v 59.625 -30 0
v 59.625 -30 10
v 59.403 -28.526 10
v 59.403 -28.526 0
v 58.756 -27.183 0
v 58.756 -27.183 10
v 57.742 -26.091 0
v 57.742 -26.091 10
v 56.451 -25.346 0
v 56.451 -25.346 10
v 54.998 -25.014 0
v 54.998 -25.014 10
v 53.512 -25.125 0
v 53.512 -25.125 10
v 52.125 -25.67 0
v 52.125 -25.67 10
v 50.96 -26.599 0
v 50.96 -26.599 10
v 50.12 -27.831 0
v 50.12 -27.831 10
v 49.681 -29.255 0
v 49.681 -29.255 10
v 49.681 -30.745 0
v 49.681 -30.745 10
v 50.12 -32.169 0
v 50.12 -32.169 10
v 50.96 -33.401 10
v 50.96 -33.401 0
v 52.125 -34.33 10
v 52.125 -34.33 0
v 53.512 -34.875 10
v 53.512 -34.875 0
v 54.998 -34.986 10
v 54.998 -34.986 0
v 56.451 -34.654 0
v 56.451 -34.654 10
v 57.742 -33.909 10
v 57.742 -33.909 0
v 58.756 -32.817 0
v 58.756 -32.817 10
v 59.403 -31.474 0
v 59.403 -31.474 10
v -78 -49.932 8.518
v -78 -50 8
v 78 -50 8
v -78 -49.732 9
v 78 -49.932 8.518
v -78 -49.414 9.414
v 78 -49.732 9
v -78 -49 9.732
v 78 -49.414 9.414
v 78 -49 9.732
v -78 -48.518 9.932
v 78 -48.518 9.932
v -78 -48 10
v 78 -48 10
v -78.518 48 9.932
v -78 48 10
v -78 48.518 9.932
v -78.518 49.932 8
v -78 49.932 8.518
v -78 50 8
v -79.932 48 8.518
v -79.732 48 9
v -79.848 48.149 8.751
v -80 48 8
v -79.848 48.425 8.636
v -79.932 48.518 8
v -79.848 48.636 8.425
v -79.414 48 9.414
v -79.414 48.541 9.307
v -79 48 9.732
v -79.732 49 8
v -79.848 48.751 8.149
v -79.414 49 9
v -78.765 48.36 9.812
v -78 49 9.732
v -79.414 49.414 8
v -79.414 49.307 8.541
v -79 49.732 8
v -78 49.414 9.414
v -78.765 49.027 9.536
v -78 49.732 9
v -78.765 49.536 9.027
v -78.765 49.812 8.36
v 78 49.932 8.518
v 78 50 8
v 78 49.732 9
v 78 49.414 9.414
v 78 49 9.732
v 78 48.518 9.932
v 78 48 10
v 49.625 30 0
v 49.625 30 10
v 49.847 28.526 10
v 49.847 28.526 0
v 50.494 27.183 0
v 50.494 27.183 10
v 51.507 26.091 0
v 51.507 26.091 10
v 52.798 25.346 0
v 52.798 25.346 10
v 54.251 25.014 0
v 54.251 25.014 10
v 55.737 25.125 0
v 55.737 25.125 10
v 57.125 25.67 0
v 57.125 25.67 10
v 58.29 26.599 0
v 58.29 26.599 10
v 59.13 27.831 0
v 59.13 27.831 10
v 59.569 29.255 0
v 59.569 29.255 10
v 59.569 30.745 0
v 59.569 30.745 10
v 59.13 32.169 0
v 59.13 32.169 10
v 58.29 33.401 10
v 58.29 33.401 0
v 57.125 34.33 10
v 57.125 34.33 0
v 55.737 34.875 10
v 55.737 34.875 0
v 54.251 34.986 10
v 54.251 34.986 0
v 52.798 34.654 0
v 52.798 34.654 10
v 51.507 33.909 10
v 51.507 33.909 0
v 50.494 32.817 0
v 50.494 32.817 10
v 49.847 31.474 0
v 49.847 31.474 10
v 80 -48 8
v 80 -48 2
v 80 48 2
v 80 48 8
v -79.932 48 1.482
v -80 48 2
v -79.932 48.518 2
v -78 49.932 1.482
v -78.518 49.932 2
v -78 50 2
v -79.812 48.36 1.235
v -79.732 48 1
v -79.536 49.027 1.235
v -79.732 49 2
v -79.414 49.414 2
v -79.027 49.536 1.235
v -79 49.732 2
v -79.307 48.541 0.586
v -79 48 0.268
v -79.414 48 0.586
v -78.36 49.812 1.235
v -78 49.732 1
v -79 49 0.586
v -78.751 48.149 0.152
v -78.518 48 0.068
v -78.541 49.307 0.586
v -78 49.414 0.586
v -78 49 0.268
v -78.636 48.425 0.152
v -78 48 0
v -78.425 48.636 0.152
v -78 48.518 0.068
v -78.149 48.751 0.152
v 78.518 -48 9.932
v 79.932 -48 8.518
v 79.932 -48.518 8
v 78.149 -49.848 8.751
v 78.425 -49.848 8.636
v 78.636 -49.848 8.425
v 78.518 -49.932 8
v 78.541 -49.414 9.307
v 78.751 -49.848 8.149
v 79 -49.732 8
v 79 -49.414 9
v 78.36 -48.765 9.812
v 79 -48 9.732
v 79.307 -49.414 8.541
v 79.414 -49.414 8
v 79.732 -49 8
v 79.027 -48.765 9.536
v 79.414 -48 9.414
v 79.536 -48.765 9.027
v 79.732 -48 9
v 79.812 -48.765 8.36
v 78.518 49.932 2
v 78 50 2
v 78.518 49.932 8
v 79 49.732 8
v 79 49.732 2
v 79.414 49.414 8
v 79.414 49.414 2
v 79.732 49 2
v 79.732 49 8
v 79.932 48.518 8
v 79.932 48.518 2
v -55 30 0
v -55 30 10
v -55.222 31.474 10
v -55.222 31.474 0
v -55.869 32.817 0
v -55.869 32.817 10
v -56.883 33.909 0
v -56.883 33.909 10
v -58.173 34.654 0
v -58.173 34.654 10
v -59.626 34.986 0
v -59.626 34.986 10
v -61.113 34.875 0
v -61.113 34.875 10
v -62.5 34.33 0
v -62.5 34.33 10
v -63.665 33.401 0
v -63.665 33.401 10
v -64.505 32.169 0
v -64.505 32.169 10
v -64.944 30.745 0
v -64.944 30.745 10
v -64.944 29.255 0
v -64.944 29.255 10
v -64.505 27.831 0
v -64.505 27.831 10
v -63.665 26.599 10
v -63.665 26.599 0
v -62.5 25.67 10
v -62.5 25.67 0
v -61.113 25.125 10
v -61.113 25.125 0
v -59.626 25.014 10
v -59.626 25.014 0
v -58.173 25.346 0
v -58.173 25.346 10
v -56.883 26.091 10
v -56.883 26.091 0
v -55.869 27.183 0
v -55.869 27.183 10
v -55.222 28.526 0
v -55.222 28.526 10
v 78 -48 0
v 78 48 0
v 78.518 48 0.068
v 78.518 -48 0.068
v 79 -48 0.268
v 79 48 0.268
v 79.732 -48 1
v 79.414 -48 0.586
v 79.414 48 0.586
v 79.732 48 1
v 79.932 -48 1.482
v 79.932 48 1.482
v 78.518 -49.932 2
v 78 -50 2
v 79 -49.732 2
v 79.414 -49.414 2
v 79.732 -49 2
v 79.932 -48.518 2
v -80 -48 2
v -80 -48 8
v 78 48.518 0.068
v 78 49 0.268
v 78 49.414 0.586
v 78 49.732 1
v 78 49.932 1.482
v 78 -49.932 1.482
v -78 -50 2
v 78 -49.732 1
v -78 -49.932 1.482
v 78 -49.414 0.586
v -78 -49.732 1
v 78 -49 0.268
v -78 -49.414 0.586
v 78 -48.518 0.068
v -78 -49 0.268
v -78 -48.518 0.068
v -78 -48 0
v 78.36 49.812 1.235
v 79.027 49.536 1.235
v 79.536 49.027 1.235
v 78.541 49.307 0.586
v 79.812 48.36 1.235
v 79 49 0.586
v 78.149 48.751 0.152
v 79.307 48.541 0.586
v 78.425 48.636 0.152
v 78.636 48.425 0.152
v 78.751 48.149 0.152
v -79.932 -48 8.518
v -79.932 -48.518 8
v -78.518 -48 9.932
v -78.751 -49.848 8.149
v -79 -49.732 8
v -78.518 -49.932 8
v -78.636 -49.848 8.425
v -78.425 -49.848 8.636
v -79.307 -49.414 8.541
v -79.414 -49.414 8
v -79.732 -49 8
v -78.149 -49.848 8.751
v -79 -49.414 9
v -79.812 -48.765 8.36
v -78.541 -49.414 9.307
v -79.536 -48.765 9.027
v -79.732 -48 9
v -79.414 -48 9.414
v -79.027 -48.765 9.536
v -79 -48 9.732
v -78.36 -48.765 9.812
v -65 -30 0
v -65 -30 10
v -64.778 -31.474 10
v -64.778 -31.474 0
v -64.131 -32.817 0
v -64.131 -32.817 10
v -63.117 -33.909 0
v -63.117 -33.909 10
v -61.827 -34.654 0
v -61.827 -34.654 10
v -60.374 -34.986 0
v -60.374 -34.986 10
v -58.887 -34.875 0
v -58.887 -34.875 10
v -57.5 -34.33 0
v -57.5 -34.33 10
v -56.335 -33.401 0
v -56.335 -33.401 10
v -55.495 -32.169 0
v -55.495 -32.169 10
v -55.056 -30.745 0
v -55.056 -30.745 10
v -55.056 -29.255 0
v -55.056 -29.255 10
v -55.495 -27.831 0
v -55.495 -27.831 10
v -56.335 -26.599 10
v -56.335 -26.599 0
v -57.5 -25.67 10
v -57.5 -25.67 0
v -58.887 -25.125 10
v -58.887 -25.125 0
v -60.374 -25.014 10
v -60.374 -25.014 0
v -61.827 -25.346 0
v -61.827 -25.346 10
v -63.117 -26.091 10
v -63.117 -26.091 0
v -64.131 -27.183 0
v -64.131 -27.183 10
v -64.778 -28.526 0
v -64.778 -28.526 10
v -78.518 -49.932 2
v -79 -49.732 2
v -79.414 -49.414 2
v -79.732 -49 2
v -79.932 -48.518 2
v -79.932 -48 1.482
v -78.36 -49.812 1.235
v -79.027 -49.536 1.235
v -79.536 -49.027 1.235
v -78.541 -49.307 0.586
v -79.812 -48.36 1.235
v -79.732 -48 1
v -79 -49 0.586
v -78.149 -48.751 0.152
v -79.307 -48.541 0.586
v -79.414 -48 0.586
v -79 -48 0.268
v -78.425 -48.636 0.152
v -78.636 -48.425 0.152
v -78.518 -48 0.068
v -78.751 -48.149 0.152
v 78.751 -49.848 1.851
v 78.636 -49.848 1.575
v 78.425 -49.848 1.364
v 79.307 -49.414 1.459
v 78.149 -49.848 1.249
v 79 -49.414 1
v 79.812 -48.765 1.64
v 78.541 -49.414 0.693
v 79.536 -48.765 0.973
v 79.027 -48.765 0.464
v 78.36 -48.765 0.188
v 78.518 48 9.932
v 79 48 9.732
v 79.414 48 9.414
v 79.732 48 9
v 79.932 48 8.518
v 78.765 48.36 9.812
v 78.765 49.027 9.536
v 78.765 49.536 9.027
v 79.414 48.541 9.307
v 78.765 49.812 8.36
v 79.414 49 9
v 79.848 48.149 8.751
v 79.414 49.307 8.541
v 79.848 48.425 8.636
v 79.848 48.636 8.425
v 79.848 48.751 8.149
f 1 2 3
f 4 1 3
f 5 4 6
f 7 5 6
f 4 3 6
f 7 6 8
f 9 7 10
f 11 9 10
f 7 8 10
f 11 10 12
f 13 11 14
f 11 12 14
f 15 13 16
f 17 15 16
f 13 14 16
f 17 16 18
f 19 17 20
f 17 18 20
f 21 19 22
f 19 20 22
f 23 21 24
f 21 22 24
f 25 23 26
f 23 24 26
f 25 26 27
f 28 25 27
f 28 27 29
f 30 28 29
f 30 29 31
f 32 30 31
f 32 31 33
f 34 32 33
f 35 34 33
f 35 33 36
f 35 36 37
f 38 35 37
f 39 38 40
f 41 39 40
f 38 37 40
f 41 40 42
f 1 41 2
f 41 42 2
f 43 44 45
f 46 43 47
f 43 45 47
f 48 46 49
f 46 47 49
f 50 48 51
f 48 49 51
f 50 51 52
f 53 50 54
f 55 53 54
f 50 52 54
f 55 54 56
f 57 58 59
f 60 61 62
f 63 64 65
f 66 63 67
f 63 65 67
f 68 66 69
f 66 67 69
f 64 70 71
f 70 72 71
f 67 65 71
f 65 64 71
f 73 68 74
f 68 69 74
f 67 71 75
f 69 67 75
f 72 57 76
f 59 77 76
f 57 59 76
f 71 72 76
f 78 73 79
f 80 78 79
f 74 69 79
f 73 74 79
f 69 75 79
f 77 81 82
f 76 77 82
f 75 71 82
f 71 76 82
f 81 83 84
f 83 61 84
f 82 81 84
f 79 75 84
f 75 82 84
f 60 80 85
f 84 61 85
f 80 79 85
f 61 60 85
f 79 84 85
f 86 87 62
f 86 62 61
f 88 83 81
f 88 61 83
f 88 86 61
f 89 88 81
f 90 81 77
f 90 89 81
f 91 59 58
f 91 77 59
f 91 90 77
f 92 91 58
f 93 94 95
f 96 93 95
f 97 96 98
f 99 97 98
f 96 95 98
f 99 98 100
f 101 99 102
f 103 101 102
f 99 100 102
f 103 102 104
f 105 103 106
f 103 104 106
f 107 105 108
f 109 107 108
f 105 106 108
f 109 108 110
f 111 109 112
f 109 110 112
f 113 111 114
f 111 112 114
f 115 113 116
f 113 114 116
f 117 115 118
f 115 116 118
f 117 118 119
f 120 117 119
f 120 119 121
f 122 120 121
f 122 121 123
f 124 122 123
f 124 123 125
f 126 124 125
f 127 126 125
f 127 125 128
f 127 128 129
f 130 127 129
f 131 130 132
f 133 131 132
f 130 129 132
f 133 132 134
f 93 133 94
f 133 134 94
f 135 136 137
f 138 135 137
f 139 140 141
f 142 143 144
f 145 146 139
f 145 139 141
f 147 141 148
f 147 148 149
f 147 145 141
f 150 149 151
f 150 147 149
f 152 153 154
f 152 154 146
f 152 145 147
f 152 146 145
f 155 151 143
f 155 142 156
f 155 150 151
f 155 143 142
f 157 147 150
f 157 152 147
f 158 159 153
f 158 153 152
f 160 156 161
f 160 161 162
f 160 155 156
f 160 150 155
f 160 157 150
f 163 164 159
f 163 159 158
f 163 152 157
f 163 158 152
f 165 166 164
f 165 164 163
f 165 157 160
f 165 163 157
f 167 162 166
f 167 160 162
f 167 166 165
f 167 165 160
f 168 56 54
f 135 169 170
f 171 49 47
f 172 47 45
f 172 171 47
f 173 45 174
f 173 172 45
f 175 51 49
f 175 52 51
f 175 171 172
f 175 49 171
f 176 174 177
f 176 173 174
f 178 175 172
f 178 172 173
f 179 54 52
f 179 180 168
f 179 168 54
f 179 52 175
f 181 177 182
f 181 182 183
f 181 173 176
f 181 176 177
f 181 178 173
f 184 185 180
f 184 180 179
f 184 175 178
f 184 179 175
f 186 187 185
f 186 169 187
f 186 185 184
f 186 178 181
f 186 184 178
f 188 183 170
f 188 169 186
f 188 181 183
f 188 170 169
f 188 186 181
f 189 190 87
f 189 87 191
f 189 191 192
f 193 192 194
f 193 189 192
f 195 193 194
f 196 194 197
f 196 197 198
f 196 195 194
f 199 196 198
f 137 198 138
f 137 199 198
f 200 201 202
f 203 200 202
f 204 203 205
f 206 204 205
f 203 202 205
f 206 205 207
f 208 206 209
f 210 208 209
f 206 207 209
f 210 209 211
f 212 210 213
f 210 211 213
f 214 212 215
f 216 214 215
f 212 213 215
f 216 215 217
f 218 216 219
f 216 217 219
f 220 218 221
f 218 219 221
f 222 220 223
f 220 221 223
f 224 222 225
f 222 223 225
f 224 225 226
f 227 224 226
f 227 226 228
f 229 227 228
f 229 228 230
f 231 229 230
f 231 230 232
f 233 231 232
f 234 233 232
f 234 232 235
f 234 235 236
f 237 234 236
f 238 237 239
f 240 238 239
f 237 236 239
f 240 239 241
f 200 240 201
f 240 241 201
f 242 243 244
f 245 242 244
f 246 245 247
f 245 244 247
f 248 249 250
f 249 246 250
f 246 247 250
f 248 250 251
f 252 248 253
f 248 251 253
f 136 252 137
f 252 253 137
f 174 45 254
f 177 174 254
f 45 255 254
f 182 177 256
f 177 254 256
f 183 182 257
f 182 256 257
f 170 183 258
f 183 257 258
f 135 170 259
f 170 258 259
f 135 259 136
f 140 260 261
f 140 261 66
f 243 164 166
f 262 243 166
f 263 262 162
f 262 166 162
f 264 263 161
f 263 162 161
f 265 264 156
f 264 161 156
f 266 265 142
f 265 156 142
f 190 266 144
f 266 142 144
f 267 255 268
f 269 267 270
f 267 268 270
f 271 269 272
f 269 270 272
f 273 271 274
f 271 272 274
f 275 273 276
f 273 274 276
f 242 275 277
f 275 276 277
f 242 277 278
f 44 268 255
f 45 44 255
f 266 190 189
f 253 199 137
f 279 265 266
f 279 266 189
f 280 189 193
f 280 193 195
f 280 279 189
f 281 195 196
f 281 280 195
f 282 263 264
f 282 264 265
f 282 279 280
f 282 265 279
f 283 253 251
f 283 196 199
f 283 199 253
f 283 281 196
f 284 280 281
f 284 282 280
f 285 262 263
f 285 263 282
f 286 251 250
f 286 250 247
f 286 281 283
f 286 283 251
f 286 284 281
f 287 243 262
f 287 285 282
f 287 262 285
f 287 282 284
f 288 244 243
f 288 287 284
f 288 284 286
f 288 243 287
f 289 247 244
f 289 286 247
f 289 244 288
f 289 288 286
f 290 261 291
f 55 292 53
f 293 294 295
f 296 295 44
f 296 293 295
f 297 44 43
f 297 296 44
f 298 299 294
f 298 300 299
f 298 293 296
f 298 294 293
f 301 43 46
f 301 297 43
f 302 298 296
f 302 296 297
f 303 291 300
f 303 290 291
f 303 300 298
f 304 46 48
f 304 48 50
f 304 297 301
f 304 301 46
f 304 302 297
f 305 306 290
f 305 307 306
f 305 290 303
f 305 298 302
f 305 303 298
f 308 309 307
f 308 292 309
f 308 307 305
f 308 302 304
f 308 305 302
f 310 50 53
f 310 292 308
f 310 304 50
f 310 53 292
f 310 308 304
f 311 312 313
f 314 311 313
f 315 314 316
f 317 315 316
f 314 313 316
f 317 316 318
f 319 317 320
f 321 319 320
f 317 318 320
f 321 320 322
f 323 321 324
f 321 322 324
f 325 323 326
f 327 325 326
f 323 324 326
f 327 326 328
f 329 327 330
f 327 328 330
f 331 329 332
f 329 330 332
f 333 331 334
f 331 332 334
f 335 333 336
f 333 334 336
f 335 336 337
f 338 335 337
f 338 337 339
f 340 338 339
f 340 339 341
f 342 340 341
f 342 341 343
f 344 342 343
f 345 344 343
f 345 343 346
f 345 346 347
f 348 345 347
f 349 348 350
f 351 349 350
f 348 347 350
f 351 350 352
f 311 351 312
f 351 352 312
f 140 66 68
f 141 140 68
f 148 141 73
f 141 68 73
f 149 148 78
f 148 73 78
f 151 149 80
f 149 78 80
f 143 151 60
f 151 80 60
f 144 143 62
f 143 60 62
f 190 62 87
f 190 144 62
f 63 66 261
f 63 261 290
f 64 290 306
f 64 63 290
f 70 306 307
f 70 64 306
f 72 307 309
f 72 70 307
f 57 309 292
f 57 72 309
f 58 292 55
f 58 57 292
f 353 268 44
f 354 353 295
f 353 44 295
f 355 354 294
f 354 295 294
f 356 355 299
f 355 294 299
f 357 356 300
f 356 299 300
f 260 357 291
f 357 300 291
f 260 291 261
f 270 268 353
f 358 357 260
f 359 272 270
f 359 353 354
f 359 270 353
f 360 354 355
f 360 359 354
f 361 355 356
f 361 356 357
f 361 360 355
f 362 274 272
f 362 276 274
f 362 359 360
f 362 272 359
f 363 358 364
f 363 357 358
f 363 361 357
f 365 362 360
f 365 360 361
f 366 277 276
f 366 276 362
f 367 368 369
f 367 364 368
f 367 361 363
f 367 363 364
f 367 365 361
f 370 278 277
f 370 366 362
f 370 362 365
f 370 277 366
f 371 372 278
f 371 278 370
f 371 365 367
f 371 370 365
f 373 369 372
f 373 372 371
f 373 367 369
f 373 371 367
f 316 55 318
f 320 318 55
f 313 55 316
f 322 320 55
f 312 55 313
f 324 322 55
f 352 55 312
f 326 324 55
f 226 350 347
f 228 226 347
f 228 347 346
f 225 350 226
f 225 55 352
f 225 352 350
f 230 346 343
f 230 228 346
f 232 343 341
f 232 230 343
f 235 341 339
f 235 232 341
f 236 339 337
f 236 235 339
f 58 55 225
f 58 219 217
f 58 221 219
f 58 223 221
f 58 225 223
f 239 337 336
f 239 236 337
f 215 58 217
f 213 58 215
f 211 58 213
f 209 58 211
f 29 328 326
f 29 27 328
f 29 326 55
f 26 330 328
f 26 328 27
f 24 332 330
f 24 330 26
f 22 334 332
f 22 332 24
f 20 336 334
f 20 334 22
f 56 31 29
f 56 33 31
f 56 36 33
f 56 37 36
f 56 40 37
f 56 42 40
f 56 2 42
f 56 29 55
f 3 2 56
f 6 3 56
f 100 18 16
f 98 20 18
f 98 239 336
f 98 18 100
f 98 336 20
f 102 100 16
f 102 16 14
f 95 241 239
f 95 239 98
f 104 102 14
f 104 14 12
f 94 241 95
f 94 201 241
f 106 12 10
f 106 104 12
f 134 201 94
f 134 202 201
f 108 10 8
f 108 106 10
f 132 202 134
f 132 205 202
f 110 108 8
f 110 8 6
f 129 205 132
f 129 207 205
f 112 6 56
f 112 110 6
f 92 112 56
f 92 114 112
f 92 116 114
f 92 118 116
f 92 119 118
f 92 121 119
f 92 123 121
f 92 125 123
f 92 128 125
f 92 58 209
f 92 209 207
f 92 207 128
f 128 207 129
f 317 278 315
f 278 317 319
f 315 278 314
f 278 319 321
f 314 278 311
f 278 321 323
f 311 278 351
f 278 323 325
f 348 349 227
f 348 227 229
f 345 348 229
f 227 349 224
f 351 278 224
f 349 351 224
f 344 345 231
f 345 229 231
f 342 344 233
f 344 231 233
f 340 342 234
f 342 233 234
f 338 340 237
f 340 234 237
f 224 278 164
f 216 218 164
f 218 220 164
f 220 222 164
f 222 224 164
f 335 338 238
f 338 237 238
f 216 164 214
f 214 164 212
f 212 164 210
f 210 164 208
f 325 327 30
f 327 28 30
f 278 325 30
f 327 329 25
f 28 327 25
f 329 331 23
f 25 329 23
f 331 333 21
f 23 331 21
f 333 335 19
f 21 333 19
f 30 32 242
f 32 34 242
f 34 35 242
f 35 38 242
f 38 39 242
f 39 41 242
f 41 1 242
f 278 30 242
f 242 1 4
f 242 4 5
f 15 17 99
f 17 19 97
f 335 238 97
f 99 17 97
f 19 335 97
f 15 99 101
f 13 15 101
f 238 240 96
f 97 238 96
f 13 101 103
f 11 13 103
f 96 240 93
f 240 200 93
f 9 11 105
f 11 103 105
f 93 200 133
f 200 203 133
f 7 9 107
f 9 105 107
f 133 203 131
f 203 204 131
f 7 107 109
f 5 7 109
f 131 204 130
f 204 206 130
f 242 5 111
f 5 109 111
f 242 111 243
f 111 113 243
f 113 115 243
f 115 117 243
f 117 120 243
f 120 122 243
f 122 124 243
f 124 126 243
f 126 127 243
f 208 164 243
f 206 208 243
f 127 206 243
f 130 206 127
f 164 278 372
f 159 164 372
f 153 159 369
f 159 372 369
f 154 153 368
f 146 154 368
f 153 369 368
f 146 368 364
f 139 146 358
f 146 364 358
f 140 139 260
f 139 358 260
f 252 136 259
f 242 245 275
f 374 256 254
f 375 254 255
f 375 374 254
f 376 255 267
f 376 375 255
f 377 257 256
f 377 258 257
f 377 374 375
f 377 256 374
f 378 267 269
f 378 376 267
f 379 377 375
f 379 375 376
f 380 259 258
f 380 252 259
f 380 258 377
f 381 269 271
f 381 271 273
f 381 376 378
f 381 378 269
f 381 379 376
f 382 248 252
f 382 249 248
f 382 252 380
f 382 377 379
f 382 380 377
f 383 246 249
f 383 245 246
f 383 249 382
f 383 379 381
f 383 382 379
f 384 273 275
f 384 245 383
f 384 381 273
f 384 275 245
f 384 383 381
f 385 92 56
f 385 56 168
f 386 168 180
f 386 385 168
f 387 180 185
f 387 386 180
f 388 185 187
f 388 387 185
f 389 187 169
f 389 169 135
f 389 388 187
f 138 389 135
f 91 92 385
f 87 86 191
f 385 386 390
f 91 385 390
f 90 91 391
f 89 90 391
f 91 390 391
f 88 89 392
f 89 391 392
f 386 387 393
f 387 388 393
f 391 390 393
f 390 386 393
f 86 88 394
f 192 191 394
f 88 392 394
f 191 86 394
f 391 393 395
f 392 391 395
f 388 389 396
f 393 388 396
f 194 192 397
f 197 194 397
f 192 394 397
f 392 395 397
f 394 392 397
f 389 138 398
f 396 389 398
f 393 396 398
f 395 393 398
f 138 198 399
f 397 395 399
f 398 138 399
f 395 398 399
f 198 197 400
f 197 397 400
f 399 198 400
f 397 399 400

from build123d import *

# Parameters (mm, degrees)
SKETCH1_W           = 160
SKETCH1_H           = 100
BOSS_EXTRUDE2_DEPTH = 10
SKETCH2_R           = 5
CUT_EXTRUDE1_DEPTH  = 10
FILLET3_R           = 2
FILLET4_R           = 2
FILLET5_R           = 2
FILLET6_R           = 2


with BuildPart() as part:
    # Sketch1 → Boss-Extrude2 (new body)
    with BuildSketch(Plane.XY):
        Rectangle(SKETCH1_W, SKETCH1_H)
    extrude(amount=BOSS_EXTRUDE2_DEPTH)

    # Sketch2 → Cut-Extrude1 (cut)
    with BuildSketch(Plane.XY.offset(10)):
        with Locations((-60, 30)):
            Circle(SKETCH2_R)
        with Locations(Location((54.624761616, 30, 0), (0, 0, 180))):
            Circle(SKETCH2_R)
        with Locations((54.624761616, -30)):
            Circle(SKETCH2_R)
        with Locations(Location((-60, -30, 0), (0, 0, 180))):
            Circle(SKETCH2_R)
    extrude(amount=-CUT_EXTRUDE1_DEPTH, mode=Mode.SUBTRACT)

    # Fillet3
    fillet3_edges = [part.edges().sort_by_distance(p)[0] for p in [
        (0, 50, 10),
        (-80, 0, 10),
        (-80, 50, 5),
    ]]
    fillet(fillet3_edges, radius=FILLET3_R)

    # Fillet4
    fillet4_edges = [part.edges().sort_by_distance(p)[0] for p in [
        (80, -1, 10),
        (80, 50, 4),
        (80, 49.414213562, 9.414213562),
        (80, 0, 0),
    ]]
    fillet(fillet4_edges, radius=FILLET4_R)

    # Fillet5
    fillet5_edges = [part.edges().sort_by_distance(p)[0] for p in [
        (0, -50, 10),
        (-80, -50, 4),
        (-79.414213562, -50, 9.414213562),
        (80, -50, 5),
        (79.414213562, -50, 9.414213562),
        (79.414213562, -50, 0.585786438),
        (-1, -50, 0),
    ]]
    fillet(fillet5_edges, radius=FILLET5_R)

    # Fillet6
    # the kernel refuses this fillet: 2 mm, written as the material it takes off along each edge
    with BuildSketch(Plane(origin=(78, 48, 2), x_dir=(0, 1, 0), z_dir=(0, 0, -1))) as fillet6_piece_1_section:
        Polygon((0, 0), (FILLET6_R, 0), (FILLET6_R, FILLET6_R), (0, FILLET6_R), align=None)
    fillet6_piece_1 = extrude(amount=FILLET6_R, mode=Mode.PRIVATE)
    fillet6_piece_1 = fillet6_piece_1 - Plane(origin=(78, 48, 2), x_dir=(-0.7071067811865475, -0.7071067811865476, 0), z_dir=(0, 0, -1)) * Sphere(FILLET6_R, mode=Mode.PRIVATE)
    add(fillet6_piece_1, mode=Mode.SUBTRACT)
    with BuildSketch(Plane(origin=(-78, -48, 2), x_dir=(-1, 0, 0), z_dir=(0, 0, -1))) as fillet6_piece_2_section:
        Polygon((0, 0), (FILLET6_R, 0), (FILLET6_R, -FILLET6_R), (0, -FILLET6_R), align=None)
    fillet6_piece_2 = extrude(amount=FILLET6_R, mode=Mode.PRIVATE)
    fillet6_piece_2 = fillet6_piece_2 - Plane(origin=(-78, -48, 2), x_dir=(0.7071067811865475, 0.7071067811865475, 0), z_dir=(0, 0, -1)) * Sphere(FILLET6_R, mode=Mode.PRIVATE)
    add(fillet6_piece_2, mode=Mode.SUBTRACT)
    with BuildSketch(Plane(origin=(-80, -48, 0), x_dir=(1, 0, 0), z_dir=(0, 1, 0))) as fillet6_piece_3:
        with BuildLine():
            CenterArc((FILLET6_R, -FILLET6_R), FILLET6_R, 90, 90)
            Line((0, -FILLET6_R), (0, 0))
            Line((0, 0), (FILLET6_R, 0))
        make_face()
    extrude(amount=96, mode=Mode.SUBTRACT)
    with BuildSketch(Plane(origin=(-78, 48, 0), x_dir=(-1, 0, 0), z_dir=(0, -1, 0))) as fillet6_piece_4:
        with BuildLine():
            CenterArc((2 - FILLET6_R, -FILLET6_R), FILLET6_R, 0, 90)
            Line((2, -FILLET6_R), (2, 0))
            Line((2, 0), (2 - FILLET6_R, 0))
        make_face()
    revolve(axis=Axis((-78, 48, 0), (0, 0, -1)), revolution_arc=90, mode=Mode.SUBTRACT)
    with BuildSketch(Plane(origin=(-78, 50, 0), x_dir=(0, -1, 0), z_dir=(1, 0, 0))) as fillet6_piece_5:
        with BuildLine():
            CenterArc((FILLET6_R, -FILLET6_R), FILLET6_R, 90, 90)
            Line((0, -FILLET6_R), (0, 0))
            Line((0, 0), (FILLET6_R, 0))
        make_face()
    extrude(amount=156, mode=Mode.SUBTRACT)


solid = part.part
